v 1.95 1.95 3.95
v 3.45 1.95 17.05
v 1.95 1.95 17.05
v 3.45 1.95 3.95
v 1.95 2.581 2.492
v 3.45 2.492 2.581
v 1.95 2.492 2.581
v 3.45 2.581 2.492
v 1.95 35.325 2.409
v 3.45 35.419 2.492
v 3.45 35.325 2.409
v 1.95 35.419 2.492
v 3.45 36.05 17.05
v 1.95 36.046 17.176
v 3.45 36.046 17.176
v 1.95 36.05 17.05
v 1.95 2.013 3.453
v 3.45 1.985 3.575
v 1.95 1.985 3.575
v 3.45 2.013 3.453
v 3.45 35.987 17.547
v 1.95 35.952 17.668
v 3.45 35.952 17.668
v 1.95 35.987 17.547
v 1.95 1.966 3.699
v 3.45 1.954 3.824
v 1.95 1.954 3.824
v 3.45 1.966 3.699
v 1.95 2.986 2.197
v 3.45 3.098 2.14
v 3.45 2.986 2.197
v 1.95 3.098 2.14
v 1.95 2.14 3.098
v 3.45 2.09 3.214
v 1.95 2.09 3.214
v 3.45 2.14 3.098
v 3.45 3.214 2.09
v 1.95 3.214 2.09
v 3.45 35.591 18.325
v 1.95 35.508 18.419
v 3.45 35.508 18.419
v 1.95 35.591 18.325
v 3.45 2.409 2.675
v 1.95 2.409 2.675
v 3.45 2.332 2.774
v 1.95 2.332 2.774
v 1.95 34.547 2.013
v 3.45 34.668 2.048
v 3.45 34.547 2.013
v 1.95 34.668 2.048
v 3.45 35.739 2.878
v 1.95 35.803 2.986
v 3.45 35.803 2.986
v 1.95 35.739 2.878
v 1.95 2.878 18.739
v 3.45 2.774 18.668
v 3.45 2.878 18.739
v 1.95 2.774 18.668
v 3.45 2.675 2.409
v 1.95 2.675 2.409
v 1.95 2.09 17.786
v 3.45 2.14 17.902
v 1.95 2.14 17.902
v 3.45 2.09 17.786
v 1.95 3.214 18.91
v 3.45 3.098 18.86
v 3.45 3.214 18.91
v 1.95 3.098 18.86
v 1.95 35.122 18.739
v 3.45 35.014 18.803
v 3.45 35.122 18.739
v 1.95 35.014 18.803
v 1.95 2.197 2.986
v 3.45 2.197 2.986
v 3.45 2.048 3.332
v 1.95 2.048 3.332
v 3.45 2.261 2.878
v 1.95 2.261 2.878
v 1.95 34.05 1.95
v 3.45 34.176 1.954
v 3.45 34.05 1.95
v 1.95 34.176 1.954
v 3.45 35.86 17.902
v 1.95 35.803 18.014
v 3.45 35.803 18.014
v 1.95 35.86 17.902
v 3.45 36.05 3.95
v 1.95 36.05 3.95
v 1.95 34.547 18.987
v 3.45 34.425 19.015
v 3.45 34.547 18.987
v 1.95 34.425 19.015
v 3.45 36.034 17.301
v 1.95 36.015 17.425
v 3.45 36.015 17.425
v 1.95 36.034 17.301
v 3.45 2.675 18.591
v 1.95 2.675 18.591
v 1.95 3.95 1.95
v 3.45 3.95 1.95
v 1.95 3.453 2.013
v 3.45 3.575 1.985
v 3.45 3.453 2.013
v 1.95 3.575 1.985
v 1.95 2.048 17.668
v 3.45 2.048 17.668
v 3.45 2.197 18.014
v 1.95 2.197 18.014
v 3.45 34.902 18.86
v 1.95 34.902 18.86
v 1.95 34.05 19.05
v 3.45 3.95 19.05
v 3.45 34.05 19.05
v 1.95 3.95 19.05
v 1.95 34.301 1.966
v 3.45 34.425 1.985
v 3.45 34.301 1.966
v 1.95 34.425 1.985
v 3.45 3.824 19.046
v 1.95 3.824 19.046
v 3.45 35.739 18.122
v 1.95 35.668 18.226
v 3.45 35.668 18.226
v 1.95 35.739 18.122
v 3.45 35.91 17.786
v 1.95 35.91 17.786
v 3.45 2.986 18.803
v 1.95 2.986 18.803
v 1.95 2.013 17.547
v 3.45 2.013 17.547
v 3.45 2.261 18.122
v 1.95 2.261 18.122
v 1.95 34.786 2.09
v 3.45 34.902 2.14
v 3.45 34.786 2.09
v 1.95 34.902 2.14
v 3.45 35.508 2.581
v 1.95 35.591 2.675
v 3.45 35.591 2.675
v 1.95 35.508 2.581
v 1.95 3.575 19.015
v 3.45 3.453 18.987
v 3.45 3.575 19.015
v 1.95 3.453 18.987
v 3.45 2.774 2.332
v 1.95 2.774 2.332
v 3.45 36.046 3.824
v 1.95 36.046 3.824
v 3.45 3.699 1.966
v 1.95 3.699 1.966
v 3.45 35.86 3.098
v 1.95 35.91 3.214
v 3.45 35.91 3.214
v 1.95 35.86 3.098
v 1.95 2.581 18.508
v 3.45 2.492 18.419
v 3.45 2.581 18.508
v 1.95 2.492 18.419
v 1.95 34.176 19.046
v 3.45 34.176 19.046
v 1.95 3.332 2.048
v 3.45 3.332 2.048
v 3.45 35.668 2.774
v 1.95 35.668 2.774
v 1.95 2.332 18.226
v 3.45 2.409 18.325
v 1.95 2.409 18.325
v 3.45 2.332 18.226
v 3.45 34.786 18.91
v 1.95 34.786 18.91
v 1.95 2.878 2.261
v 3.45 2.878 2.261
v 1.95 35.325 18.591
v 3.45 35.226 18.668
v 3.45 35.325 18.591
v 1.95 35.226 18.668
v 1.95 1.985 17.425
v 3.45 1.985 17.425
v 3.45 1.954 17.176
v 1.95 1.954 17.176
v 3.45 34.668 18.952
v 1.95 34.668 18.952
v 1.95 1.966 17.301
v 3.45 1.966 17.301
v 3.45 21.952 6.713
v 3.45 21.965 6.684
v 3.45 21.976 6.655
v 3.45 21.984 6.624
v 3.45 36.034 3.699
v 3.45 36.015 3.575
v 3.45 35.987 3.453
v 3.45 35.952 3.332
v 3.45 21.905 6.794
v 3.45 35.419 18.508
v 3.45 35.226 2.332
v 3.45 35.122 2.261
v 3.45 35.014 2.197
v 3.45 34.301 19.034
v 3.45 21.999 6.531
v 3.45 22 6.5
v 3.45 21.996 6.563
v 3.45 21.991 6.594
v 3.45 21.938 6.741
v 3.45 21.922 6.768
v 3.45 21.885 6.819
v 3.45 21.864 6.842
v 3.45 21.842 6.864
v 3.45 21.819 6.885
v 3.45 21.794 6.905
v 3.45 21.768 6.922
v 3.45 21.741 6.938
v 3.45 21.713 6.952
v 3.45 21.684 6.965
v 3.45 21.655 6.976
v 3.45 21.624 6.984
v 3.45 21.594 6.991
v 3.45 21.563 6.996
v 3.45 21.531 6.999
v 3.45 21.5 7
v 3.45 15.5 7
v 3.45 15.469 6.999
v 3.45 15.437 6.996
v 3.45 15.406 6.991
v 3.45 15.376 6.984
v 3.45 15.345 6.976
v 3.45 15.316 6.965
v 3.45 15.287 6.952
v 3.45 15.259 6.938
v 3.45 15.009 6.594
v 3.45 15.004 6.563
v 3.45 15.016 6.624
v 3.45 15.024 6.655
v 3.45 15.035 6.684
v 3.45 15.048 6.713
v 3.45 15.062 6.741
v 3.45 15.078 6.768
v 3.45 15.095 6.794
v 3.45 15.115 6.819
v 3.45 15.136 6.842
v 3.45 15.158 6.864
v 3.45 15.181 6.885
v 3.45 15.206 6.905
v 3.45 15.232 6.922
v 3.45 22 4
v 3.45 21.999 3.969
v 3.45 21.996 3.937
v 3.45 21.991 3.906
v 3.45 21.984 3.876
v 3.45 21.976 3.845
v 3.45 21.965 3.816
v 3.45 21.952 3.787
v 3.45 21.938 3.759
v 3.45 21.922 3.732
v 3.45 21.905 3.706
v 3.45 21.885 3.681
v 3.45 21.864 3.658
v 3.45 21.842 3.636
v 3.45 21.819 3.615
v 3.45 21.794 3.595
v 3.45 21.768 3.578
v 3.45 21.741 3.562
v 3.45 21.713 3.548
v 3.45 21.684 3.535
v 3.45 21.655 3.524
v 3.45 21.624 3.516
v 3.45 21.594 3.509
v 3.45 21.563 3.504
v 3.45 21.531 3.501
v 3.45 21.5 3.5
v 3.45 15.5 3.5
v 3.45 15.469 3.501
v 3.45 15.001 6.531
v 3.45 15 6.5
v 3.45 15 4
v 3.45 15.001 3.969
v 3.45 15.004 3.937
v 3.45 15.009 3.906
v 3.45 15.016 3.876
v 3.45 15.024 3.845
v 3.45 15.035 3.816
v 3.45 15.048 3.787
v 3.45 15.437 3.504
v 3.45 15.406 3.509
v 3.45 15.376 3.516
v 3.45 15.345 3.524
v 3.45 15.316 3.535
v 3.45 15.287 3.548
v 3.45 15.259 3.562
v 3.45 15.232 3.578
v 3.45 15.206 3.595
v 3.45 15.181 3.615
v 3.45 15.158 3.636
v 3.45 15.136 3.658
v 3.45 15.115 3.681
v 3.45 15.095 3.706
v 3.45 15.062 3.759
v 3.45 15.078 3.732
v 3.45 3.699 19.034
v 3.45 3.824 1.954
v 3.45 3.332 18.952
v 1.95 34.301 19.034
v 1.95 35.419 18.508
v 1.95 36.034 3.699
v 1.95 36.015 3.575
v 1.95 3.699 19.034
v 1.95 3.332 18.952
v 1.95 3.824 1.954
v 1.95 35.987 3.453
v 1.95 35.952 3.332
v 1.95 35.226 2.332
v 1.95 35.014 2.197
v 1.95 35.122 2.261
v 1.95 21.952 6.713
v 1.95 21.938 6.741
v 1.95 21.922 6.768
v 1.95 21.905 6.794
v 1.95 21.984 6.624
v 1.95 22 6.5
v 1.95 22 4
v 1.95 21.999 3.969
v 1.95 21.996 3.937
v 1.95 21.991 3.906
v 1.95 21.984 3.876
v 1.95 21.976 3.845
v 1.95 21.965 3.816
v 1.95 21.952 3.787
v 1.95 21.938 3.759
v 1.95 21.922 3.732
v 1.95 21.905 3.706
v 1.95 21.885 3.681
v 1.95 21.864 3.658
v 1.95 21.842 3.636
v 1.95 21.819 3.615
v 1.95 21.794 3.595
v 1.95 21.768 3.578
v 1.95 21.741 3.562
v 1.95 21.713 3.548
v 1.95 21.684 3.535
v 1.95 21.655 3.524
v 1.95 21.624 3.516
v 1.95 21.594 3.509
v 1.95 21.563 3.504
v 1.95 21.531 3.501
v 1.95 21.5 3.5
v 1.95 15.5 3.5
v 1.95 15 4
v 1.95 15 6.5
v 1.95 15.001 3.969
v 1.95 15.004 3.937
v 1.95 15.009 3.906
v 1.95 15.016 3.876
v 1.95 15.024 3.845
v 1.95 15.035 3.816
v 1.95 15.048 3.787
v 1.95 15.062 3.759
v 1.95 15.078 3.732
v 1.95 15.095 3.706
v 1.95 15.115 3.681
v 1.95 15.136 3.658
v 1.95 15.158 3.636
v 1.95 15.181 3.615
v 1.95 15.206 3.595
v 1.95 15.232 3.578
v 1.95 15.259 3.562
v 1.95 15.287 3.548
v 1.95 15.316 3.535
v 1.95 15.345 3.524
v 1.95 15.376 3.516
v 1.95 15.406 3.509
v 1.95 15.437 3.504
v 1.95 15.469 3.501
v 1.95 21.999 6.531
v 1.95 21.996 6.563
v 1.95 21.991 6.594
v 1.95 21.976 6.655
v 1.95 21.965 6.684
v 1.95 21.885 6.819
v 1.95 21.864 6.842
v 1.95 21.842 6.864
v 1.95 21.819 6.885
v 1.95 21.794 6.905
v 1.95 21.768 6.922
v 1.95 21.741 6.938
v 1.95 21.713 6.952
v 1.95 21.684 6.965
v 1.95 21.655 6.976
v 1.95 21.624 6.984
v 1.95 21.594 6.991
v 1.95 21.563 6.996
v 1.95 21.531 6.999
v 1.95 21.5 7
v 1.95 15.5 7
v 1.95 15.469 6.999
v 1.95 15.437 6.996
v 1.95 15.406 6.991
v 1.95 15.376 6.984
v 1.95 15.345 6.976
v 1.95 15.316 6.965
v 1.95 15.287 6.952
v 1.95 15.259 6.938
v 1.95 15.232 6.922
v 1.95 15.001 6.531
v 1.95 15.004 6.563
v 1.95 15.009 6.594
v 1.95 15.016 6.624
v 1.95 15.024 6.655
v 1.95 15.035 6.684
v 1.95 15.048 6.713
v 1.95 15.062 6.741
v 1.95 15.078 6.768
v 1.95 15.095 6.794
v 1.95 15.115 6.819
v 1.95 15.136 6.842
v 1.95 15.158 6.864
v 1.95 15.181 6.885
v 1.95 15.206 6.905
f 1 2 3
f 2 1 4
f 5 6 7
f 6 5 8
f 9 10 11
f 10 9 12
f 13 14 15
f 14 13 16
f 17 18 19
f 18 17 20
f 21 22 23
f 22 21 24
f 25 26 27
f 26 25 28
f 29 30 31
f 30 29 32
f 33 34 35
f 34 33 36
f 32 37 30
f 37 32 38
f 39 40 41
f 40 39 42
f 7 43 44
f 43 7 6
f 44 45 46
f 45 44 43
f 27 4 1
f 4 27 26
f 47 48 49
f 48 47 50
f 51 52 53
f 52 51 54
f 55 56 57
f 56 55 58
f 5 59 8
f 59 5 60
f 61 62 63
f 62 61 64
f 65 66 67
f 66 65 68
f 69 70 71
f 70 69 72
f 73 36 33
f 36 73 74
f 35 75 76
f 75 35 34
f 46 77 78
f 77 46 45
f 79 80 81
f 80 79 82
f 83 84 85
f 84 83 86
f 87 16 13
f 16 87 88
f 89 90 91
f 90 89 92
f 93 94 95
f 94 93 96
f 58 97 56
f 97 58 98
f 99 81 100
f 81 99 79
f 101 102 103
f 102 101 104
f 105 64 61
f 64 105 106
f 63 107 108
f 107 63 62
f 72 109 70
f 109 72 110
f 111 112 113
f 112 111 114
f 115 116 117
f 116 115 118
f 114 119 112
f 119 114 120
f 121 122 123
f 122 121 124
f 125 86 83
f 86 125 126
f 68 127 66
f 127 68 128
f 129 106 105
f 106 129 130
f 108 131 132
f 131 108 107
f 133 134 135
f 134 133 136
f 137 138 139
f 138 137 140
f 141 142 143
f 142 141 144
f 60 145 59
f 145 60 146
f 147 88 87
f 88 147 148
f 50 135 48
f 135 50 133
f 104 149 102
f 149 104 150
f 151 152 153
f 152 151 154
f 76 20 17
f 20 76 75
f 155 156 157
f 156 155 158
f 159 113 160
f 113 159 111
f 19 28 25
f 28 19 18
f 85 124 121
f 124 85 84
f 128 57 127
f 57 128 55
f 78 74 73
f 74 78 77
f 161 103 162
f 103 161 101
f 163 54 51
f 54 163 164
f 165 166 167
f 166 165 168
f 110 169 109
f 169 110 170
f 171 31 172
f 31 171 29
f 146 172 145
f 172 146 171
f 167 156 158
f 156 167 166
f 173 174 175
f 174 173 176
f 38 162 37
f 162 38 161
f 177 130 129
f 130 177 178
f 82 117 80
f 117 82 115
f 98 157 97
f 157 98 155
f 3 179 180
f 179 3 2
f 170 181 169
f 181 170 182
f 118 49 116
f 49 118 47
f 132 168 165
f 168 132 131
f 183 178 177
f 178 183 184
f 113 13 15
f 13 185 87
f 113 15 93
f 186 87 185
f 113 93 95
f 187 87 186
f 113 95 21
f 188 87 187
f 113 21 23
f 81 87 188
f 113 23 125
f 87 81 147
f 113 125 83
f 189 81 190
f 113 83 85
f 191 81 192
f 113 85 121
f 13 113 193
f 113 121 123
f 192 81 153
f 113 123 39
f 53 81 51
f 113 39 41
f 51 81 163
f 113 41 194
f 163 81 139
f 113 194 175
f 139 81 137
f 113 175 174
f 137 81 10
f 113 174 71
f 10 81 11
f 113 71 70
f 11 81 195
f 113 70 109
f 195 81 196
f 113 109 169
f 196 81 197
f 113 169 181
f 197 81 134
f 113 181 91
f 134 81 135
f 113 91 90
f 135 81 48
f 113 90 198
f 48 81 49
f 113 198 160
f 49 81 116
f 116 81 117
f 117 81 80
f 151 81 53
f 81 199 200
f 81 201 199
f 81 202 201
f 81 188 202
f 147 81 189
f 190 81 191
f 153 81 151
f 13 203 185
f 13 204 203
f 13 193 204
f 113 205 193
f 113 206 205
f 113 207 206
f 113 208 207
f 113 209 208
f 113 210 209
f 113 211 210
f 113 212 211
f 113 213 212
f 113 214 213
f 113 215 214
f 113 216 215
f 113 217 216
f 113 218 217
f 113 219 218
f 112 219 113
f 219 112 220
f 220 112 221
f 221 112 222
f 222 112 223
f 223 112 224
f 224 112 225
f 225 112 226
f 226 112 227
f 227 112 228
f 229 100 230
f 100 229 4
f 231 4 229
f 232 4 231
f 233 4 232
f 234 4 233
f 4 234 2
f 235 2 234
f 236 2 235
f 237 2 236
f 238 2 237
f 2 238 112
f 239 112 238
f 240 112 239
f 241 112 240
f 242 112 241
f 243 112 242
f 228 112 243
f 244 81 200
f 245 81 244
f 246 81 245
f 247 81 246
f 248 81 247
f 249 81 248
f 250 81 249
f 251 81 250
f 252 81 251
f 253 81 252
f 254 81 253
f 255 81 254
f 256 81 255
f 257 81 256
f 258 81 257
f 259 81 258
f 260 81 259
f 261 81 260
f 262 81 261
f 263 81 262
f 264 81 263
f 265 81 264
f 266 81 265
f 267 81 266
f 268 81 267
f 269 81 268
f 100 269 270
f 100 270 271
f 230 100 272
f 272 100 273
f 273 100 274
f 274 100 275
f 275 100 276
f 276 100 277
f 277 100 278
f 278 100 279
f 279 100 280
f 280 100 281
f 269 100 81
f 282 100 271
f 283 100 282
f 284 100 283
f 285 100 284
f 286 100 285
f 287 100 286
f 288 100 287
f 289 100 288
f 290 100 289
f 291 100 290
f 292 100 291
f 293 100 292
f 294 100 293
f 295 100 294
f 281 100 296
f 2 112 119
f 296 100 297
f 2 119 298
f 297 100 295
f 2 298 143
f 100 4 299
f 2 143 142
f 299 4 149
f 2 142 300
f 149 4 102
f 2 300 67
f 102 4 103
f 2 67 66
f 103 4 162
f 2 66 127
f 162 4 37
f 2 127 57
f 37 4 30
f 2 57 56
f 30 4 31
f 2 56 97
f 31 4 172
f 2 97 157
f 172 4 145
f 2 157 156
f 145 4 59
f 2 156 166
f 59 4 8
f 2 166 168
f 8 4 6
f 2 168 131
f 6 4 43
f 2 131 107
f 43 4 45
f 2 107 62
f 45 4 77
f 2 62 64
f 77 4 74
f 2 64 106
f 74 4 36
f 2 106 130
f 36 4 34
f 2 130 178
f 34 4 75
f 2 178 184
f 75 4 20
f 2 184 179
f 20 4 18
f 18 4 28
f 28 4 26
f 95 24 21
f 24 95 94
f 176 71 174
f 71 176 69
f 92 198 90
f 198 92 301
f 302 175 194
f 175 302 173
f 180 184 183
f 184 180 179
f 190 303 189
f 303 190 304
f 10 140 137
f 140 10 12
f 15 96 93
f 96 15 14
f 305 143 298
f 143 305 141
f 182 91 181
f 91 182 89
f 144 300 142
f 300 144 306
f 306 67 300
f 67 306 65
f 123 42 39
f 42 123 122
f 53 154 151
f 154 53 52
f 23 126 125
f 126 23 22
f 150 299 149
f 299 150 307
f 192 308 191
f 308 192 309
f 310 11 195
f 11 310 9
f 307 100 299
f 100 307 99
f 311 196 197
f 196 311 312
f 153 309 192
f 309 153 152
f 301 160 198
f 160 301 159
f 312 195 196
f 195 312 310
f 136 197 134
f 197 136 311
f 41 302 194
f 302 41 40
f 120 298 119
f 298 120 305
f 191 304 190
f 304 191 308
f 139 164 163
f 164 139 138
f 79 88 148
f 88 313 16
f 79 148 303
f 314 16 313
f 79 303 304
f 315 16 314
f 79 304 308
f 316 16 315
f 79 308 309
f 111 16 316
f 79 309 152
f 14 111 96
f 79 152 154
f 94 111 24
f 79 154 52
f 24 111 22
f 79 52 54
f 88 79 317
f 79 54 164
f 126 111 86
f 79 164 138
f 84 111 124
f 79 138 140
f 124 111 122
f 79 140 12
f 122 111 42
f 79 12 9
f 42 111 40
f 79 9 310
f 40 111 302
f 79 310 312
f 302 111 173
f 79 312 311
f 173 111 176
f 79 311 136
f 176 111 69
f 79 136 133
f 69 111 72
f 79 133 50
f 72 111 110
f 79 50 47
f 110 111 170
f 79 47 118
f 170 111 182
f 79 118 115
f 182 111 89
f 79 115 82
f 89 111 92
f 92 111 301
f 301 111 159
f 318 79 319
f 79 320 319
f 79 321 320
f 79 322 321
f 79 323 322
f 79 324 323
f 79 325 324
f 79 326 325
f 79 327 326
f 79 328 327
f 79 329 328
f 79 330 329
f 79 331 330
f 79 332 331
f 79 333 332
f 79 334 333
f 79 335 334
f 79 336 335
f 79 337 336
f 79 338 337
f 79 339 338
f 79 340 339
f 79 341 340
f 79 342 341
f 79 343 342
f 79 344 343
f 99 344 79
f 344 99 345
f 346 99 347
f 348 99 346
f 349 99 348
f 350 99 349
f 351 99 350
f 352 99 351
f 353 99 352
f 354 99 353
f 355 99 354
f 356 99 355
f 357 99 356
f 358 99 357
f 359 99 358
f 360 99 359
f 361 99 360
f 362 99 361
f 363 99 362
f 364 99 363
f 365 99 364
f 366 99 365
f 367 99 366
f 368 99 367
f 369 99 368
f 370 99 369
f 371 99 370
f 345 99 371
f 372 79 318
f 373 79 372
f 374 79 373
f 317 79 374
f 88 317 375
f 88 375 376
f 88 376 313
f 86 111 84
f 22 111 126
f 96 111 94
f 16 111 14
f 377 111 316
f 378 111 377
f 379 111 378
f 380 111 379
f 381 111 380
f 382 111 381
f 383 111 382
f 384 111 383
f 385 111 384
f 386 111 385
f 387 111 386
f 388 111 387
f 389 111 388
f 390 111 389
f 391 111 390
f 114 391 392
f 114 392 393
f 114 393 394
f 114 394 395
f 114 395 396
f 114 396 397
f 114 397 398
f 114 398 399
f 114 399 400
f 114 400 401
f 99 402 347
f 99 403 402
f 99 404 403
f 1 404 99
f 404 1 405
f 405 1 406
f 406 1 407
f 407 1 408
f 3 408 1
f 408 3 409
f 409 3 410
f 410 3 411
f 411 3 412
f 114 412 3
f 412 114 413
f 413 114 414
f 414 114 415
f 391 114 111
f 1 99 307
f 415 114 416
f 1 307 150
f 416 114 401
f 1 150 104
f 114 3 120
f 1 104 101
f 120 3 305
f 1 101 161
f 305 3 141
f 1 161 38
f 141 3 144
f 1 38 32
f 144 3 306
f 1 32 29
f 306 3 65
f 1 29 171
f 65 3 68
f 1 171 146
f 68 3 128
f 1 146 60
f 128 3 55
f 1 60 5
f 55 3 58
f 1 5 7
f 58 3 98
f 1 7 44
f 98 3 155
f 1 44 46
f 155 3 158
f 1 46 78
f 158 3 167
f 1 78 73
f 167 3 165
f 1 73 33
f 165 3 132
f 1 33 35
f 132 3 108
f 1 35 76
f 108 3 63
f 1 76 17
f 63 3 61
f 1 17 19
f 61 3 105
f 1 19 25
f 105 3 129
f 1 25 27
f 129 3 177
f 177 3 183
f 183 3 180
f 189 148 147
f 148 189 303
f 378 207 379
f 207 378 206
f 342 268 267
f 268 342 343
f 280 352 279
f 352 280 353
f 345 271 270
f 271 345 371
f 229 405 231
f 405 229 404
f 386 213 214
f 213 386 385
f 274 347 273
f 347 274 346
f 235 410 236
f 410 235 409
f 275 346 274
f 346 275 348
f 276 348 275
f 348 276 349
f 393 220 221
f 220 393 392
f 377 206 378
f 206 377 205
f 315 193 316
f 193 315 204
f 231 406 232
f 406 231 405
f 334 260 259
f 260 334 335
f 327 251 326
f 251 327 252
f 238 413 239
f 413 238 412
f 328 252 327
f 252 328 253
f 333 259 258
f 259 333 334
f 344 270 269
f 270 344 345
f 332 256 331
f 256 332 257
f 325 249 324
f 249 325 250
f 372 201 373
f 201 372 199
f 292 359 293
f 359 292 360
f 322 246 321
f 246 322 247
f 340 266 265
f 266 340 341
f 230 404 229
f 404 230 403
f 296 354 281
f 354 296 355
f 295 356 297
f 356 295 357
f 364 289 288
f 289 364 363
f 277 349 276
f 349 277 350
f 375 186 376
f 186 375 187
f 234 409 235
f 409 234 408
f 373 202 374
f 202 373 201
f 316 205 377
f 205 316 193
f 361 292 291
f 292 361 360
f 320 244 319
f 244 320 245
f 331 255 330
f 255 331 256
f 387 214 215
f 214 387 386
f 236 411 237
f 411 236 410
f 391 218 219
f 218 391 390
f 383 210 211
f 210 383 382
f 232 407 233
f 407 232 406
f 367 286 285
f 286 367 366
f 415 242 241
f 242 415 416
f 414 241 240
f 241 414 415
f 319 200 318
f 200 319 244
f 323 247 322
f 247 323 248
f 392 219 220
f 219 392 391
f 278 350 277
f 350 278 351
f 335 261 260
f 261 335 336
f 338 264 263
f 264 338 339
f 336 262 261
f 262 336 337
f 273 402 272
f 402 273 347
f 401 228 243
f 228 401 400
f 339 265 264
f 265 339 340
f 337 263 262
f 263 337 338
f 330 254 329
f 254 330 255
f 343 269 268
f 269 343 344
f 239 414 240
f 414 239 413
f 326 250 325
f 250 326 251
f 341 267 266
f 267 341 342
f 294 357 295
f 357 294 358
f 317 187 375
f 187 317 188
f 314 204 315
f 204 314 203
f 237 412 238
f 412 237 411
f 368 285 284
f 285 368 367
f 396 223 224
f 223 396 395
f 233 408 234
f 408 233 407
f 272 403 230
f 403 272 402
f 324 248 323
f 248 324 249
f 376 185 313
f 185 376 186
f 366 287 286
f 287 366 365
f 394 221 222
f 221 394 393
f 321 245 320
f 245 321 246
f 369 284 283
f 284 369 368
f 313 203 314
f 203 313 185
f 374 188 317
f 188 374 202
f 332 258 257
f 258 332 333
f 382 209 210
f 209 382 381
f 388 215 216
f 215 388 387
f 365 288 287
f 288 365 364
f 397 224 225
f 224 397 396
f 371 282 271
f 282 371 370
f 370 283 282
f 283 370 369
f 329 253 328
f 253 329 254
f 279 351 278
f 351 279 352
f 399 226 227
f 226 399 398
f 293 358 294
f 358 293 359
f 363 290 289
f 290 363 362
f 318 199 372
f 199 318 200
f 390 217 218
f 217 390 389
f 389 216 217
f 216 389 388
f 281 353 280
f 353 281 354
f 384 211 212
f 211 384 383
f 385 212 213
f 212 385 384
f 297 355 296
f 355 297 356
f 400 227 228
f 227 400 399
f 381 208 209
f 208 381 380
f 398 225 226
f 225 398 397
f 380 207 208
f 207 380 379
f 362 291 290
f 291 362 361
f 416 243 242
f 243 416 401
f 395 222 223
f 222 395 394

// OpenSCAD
/*//////////////////////////////////////////////////////////////////
              -    FB Aka Heartman/Hearty 2016     -                   
              -   http://heartygfx.blogspot.com    -                  
              -       OpenScad Parametric Box      -                     
              -         CC BY-NC 3.0 License       -                      
////////////////////////////////////////////////////////////////////                                                                                                             
12/02/2016 - Fixed minor bug 
28/02/2016 - Added holes ventilation option                    
09/03/2016 - Added PCB feet support, fixed the shell artefact on export mode. 

*/////////////////////////// - Info - //////////////////////////////

// All coordinates are starting as integrated circuit pins.
// From the top view :

//   CoordD           <---       CoordC
//                                 ^
//                                 ^
//                                 ^
//   CoordA           --->       CoordB


////////////////////////////////////////////////////////////////////


////////// - Paramètres de la boite - Box parameters - /////////////

/* [Box dimensions] */
// - Longueur - Length  
  Length        = 48;
// - Largeur - Width
  Width         = 38;                     
// - Hauteur - Height  
  Height        = 21;  
// - Epaisseur - Wall thickness  
  Thick         = 1.5;//[2:5]  
  
/* [Box options] */
// - Diamètre Coin arrondi - Filet diameter  
  Filet         = 2;//[0.1:12] 
// - lissage de l'arrondi - Filet smoothness  
  Resolution    = 50;//[1:100] 
// - Tolérance - Tolerance (Panel/rails gap)
  m             = 0.9;
// Pieds PCB - PCB feet (x4) 
  PCBFeet       = 0;// [0:No, 1:Yes]
// - Decorations to ventilation holes
  Vent          = 1;// [0:No, 1:Yes]
// - Decoration-Holes width (in mm)
  Vent_width    = 1.5;   


  
/* [PCB_Feet] */
//All dimensions are from the center foot axis

// - Coin bas gauche - Low left corner X position
PCBPosX         = 1;
// - Coin bas gauche - Low left corner Y position
PCBPosY         = 1;
// - Longueur PCB - PCB Length
PCBLength       = 45;
// - Largeur PCB - PCB Width
PCBWidth        = 44.3;
// - Heuteur pied - Feet height
FootHeight      = 3;
// - Diamètre pied - Foot diameter
FootDia         = 5;
// - Diamètre trou - Hole diameter
FootHole        = 2;  
  

/* [STL element to export] */
//Coque haut - Top shell
TShell          = 0;// [0:No, 1:Yes]
//Coque bas- Bottom shell
BShell          = 0;// [0:No, 1:Yes]
//Panneau avant - Front panel
FPanL           = 0;// [0:No, 1:Yes]
//Panneau arrière - Back panel  
BPanL           = 1;// [0:No, 1:Yes]


  
/* [Hidden] */
// - Couleur coque - Shell color  
Couleur1        = "Orange";       
// - Couleur panneaux - Panels color    
Couleur2        = "OrangeRed";    
// Thick X 2 - making decorations thicker if it is a vent to make sure they go through shell
Dec_Thick       = Vent ? Thick*2 : Thick; 
// - Depth decoration
Dec_size        = Vent ? Thick*2 : 0.8;





/////////// - Boitier générique bord arrondis - Generic rounded box - //////////

module RoundBox($a=Length, $b=Width, $c=Height){// Cube bords arrondis
                    $fn=Resolution;            
                    translate([0,Filet,Filet]){  
                    minkowski (){                                              
                        cube ([$a-(Length/2),$b-(2*Filet),$c-(2*Filet)], center = false);
                        rotate([0,90,0]){    
                        cylinder(r=Filet,h=Length/2, center = false);
                            } 
                        }
                    }
                }// End of RoundBox Module

      
////////////////////////////////// - Module Coque/Shell - //////////////////////////////////         

module Coque(){//Coque - Shell  
    Thick = Thick*2;  
    difference(){    
        difference(){//sides decoration
            union(){    
                     difference() {//soustraction de la forme centrale - Substraction Fileted box
                      
                        difference(){//soustraction cube median - Median cube slicer
                            union() {//union               
                            difference(){//Coque    
                                RoundBox();
                                translate([Thick/2,Thick/2,Thick/2]){     
                                        RoundBox($a=Length-Thick, $b=Width-Thick, $c=Height-Thick);
                                        }
                                        }//Fin diff Coque                            
                                difference(){//largeur Rails        
                                     translate([Thick+m,Thick/2,Thick/2]){// Rails
                                          RoundBox($a=Length-((2*Thick)+(2*m)), $b=Width-Thick, $c=Height-(Thick*2));
                                                          }//fin Rails
                                     translate([((Thick+m/2)*1.55),Thick/2,Thick/2+0.1]){ // +0.1 added to avoid the artefact
                                          RoundBox($a=Length-((Thick*3)+2*m), $b=Width-Thick, $c=Height-Thick);
                                                    }           
                                                }//Fin largeur Rails
                                    }//Fin union                                   
                               translate([-Thick,-Thick,Height/2]){// Cube à soustraire
                                    cube ([Length+100, Width+100, Height], center=false);
                                            }                                            
                                      }//fin soustraction cube median - End Median cube slicer
                               translate([-Thick/2,Thick,Thick]){// Forme de soustraction centrale 
                                    RoundBox($a=Length+Thick, $b=Width-Thick*2, $c=Height-Thick);       
                                    }                          
                                }                                          


                difference(){// wall fixation box legs
                    union(){
                        translate([3*Thick +5,Thick,Height/2]){
                            rotate([90,0,0]){
                                    $fn=6;
                                    cylinder(d=16,Thick/2);
                                    }   
                            }
                            
                       translate([Length-((3*Thick)+5),Thick,Height/2]){
                            rotate([90,0,0]){
                                    $fn=6;
                                    cylinder(d=16,Thick/2);
                                    }   
                            }

                        }
                            translate([4,Thick+Filet,Height/2-57]){   
                             rotate([45,0,0]){
                                   cube([Length,40,40]);    
                                  }
                           }
                           translate([0,-(Thick*1.46),Height/2]){
                                cube([Length,Thick*2,10]);
                           }
                    } //Fin fixation box legs
            }

        union(){// outbox sides decorations
            
            for(i=[0:Thick:Length/4]){

                // Ventilation holes part code submitted by Ettie - Thanks ;) 
                    translate([10+i,-Dec_Thick+Dec_size,1]){
                    cube([Vent_width,Dec_Thick,Height/4]);
                    }
                    translate([(Length-10) - i,-Dec_Thick+Dec_size,1]){
                    cube([Vent_width,Dec_Thick,Height/4]);
                    }
                    translate([(Length-10) - i,Width-Dec_size,1]){
                    cube([Vent_width,Dec_Thick,Height/4]);
                    }
                    translate([10+i,Width-Dec_size,1]){
                    cube([Vent_width,Dec_Thick,Height/4]);
                    }
  
                
                    }// fin de for
               // }
                }//fin union decoration
            }//fin difference decoration


            union(){ //sides holes
                $fn=50;
                translate([3*Thick+5,20,Height/2+4]){
                    rotate([90,0,0]){
                    cylinder(d=2,20);
                    }
                }
                translate([Length-((3*Thick)+5),20,Height/2+4]){
                    rotate([90,0,0]){
                    cylinder(d=2,20);
                    }
                }
                translate([3*Thick+5,Width+5,Height/2-4]){
                    rotate([90,0,0]){
                    cylinder(d=2,20);
                    }
                }
                translate([Length-((3*Thick)+5),Width+5,Height/2-4]){
                    rotate([90,0,0]){
                    cylinder(d=2,20);
                    }
                }
            }//fin de sides holes

        }//fin de difference holes
}// fin coque 

////////////////////////////// - Experiment - ///////////////////////////////////////////





/////////////////////// - Foot with base filet - /////////////////////////////
module foot(FootDia,FootHole,FootHeight){
    Filet=2;
    color(Couleur1)   
    translate([0,0,Filet-1.5])
    difference(){
    
    difference(){
            //translate ([0,0,-Thick]){
                cylinder(d=FootDia+Filet,FootHeight-Thick, $fn=100);
                        //}
                    rotate_extrude($fn=100){
                            translate([(FootDia+Filet*2)/2,Filet,0]){
                                    minkowski(){
                                            square(10);
                                            circle(Filet, $fn=100);
                                        }
                                 }
                           }
                   }
            cylinder(d=FootHole,FootHeight+1, $fn=100);
               }          
}// Fin module foot
  
module Feet(){     
//////////////////// - PCB only visible in the preview mode - /////////////////////    
    translate([3*Thick+2,Thick+5,FootHeight+(Thick/2)-0.5]){
    
    %square ([PCBLength+10,PCBWidth+10]);
       translate([PCBLength/2,PCBWidth/2,0.5]){ 
        color("Olive")
        %text("PCB", halign="center", valign="center", font="Arial black");
       }
    } // Fin PCB 
  
    
////////////////////////////// - 4 Feet - //////////////////////////////////////////     
    translate([3*Thick+7,Thick+10,Thick/2]){
        foot(FootDia,FootHole,FootHeight);
    }
    translate([(3*Thick)+PCBLength+7,Thick+10,Thick/2]){
        foot(FootDia,FootHole,FootHeight);
        }
    translate([(3*Thick)+PCBLength+7,(Thick)+PCBWidth+10,Thick/2]){
        foot(FootDia,FootHole,FootHeight);
        }        
    translate([3*Thick+7,(Thick)+PCBWidth+10,Thick/2]){
        foot(FootDia,FootHole,FootHeight);
    }   

} // Fin du module Feet
 


 
 ////////////////////////////////////////////////////////////////////////
////////////////////// <- Holes Panel Manager -> ///////////////////////
////////////////////////////////////////////////////////////////////////

//                           <- Panel ->  
module Panel(Length,Width,Thick,Filet){
    scale([0.5,1,1])
    minkowski(){
            cube([Thick,Width-(Thick*2+Filet*2+m),Height-(Thick*2+Filet*2+m)]);
            translate([0,Filet,Filet])
            rotate([0,90,0])
            cylinder(r=Filet,h=Thick, $fn=100);
      }
}



//                          <- Circle hole -> 
// Cx=Cylinder X position | Cy=Cylinder Y position | Cdia= Cylinder dia | Cheight=Cyl height
module CylinderHole(OnOff,Cx,Cy,Cdia){
    if(OnOff==1)
    translate([Cx,Cy,-1])
        cylinder(d=Cdia,10, $fn=50);
}
//                          <- Square hole ->  
// Sx=Square X position | Sy=Square Y position | Sl= Square Length | Sw=Square Width | Filet = Round corner
module SquareHole(OnOff,Sx,Sy,Sl,Sw,Filet){
    if(OnOff==1)
     minkowski(){
        translate([Sx+Filet/2,Sy+Filet/2,-1])
            cube([Sl-Filet,Sw-Filet,10]);
            cylinder(d=Filet,h=10, $fn=100);
       }
}


 
//                      <- Linear text panel -> 
module LText(OnOff,Tx,Ty,Font,Size,Content){
    if(OnOff==1)
    translate([Tx,Ty,Thick+.5])
    linear_extrude(height = 0.5){
    text(Content, size=Size, font=Font);
    }
}
//                     <- Circular text panel->  
module CText(OnOff,Tx,Ty,Font,Size,TxtRadius,Angl,Turn,Content){ 
      if(OnOff==1) {
      Angle = -Angl / len(Content);
      translate([Tx,Ty,Thick+.5])
          for (i= [0:len(Content)-1] ){   
              rotate([0,0,i*Angle+90+Turn])
              translate([0,TxtRadius,0]) {
                linear_extrude(height = 0.5){
                text(Content[i], font = Font, size = Size,  valign ="baseline", halign ="center");
                    }
                }   
             }
      }
}
////////////////////// <- New module Panel -> //////////////////////
module FPanL(){
    difference(){
        color(Couleur2)
        Panel(Length,Width,Thick,Filet);
    
 
    rotate([90,0,90]){
        color(Couleur2){
//                     <- Cutting shapes from here ->  
        SquareHole  (1,9.4,1.45,6.5,14.4,1); //(On/Off, Xpos,Ypos,Length,Width,Filet)
        SquareHole  (1,18,1.45,6.5,14.4,1); //(On/Off, Xpos,Ypos,Length,Width,Filet)
            
//        CylinderHole(1,27,40,8);       //(On/Off, Xpos, Ypos, Diameter)
//                            <- To here -> 
           }
       }
}

    color(Couleur1){
        translate ([-.5,0,0])
        rotate([90,0,90]){
//                      <- Adding text from here ->          
//        LText(1,43,13,"Arial Black",3,"GPS");//(On/Off, Xpos, Ypos, "Font", Size, "Text")
//        LText(1,41,6,"Arial Black",3,"Clock");            
//                            <- To here ->
            }
      }
}


/////////////////////////// <- Main part -> /////////////////////////

if(TShell==1) {
// Coque haut - Top Shell
        color( Couleur1,1){
            translate([0,Width,Height+0.2]){
                rotate([0,180,180]){
                        Coque();
                        }
                }
        }
}
if(BShell==1)
{
// Coque bas - Bottom shell
        color(Couleur1){ 
        Coque();
        }

    color(Couleur2){
        translate ([50,90,1.8])
        rotate([0,180,90]){
//        LText(1,17,33,"Arial Black",6,"IBE Group");            
//        LText(1,15,18,"Arial Black",6,"Copyright©");            
        //LText(1,28,2,"Arial Black",6,"2018");            
//                            <- To here ->
            }
      }


}
// Pied support PCB - PCB feet
if (PCBFeet==1)
// Feet
        translate([PCBPosX,PCBPosY,0]){ 
        Feet();
        }

// Panneau avant - Front panel  <<<<<< Text and holes only on this one.
//rotate([0,-90,-90]) 
if(FPanL==1)
        translate([Length-(Thick*2+m/2),Thick+m/2,Thick+m/2])
        FPanL();

//Panneau arrière - Back panel
if(BPanL==1) {
difference() { 

    difference() { 
        color(Couleur2)
        translate([Thick+m/2,Thick+m/2,Thick+m/2])
        Panel(Length,Width,Thick,Filet);
    }    

        rotate([90,0,90]){
            color(Couleur1)
            SquareHole  (1,15,3.5,7,3.5,1); //(On/Off, Xpos,Ypos,Length,Width,Filet)
        }




}


}
